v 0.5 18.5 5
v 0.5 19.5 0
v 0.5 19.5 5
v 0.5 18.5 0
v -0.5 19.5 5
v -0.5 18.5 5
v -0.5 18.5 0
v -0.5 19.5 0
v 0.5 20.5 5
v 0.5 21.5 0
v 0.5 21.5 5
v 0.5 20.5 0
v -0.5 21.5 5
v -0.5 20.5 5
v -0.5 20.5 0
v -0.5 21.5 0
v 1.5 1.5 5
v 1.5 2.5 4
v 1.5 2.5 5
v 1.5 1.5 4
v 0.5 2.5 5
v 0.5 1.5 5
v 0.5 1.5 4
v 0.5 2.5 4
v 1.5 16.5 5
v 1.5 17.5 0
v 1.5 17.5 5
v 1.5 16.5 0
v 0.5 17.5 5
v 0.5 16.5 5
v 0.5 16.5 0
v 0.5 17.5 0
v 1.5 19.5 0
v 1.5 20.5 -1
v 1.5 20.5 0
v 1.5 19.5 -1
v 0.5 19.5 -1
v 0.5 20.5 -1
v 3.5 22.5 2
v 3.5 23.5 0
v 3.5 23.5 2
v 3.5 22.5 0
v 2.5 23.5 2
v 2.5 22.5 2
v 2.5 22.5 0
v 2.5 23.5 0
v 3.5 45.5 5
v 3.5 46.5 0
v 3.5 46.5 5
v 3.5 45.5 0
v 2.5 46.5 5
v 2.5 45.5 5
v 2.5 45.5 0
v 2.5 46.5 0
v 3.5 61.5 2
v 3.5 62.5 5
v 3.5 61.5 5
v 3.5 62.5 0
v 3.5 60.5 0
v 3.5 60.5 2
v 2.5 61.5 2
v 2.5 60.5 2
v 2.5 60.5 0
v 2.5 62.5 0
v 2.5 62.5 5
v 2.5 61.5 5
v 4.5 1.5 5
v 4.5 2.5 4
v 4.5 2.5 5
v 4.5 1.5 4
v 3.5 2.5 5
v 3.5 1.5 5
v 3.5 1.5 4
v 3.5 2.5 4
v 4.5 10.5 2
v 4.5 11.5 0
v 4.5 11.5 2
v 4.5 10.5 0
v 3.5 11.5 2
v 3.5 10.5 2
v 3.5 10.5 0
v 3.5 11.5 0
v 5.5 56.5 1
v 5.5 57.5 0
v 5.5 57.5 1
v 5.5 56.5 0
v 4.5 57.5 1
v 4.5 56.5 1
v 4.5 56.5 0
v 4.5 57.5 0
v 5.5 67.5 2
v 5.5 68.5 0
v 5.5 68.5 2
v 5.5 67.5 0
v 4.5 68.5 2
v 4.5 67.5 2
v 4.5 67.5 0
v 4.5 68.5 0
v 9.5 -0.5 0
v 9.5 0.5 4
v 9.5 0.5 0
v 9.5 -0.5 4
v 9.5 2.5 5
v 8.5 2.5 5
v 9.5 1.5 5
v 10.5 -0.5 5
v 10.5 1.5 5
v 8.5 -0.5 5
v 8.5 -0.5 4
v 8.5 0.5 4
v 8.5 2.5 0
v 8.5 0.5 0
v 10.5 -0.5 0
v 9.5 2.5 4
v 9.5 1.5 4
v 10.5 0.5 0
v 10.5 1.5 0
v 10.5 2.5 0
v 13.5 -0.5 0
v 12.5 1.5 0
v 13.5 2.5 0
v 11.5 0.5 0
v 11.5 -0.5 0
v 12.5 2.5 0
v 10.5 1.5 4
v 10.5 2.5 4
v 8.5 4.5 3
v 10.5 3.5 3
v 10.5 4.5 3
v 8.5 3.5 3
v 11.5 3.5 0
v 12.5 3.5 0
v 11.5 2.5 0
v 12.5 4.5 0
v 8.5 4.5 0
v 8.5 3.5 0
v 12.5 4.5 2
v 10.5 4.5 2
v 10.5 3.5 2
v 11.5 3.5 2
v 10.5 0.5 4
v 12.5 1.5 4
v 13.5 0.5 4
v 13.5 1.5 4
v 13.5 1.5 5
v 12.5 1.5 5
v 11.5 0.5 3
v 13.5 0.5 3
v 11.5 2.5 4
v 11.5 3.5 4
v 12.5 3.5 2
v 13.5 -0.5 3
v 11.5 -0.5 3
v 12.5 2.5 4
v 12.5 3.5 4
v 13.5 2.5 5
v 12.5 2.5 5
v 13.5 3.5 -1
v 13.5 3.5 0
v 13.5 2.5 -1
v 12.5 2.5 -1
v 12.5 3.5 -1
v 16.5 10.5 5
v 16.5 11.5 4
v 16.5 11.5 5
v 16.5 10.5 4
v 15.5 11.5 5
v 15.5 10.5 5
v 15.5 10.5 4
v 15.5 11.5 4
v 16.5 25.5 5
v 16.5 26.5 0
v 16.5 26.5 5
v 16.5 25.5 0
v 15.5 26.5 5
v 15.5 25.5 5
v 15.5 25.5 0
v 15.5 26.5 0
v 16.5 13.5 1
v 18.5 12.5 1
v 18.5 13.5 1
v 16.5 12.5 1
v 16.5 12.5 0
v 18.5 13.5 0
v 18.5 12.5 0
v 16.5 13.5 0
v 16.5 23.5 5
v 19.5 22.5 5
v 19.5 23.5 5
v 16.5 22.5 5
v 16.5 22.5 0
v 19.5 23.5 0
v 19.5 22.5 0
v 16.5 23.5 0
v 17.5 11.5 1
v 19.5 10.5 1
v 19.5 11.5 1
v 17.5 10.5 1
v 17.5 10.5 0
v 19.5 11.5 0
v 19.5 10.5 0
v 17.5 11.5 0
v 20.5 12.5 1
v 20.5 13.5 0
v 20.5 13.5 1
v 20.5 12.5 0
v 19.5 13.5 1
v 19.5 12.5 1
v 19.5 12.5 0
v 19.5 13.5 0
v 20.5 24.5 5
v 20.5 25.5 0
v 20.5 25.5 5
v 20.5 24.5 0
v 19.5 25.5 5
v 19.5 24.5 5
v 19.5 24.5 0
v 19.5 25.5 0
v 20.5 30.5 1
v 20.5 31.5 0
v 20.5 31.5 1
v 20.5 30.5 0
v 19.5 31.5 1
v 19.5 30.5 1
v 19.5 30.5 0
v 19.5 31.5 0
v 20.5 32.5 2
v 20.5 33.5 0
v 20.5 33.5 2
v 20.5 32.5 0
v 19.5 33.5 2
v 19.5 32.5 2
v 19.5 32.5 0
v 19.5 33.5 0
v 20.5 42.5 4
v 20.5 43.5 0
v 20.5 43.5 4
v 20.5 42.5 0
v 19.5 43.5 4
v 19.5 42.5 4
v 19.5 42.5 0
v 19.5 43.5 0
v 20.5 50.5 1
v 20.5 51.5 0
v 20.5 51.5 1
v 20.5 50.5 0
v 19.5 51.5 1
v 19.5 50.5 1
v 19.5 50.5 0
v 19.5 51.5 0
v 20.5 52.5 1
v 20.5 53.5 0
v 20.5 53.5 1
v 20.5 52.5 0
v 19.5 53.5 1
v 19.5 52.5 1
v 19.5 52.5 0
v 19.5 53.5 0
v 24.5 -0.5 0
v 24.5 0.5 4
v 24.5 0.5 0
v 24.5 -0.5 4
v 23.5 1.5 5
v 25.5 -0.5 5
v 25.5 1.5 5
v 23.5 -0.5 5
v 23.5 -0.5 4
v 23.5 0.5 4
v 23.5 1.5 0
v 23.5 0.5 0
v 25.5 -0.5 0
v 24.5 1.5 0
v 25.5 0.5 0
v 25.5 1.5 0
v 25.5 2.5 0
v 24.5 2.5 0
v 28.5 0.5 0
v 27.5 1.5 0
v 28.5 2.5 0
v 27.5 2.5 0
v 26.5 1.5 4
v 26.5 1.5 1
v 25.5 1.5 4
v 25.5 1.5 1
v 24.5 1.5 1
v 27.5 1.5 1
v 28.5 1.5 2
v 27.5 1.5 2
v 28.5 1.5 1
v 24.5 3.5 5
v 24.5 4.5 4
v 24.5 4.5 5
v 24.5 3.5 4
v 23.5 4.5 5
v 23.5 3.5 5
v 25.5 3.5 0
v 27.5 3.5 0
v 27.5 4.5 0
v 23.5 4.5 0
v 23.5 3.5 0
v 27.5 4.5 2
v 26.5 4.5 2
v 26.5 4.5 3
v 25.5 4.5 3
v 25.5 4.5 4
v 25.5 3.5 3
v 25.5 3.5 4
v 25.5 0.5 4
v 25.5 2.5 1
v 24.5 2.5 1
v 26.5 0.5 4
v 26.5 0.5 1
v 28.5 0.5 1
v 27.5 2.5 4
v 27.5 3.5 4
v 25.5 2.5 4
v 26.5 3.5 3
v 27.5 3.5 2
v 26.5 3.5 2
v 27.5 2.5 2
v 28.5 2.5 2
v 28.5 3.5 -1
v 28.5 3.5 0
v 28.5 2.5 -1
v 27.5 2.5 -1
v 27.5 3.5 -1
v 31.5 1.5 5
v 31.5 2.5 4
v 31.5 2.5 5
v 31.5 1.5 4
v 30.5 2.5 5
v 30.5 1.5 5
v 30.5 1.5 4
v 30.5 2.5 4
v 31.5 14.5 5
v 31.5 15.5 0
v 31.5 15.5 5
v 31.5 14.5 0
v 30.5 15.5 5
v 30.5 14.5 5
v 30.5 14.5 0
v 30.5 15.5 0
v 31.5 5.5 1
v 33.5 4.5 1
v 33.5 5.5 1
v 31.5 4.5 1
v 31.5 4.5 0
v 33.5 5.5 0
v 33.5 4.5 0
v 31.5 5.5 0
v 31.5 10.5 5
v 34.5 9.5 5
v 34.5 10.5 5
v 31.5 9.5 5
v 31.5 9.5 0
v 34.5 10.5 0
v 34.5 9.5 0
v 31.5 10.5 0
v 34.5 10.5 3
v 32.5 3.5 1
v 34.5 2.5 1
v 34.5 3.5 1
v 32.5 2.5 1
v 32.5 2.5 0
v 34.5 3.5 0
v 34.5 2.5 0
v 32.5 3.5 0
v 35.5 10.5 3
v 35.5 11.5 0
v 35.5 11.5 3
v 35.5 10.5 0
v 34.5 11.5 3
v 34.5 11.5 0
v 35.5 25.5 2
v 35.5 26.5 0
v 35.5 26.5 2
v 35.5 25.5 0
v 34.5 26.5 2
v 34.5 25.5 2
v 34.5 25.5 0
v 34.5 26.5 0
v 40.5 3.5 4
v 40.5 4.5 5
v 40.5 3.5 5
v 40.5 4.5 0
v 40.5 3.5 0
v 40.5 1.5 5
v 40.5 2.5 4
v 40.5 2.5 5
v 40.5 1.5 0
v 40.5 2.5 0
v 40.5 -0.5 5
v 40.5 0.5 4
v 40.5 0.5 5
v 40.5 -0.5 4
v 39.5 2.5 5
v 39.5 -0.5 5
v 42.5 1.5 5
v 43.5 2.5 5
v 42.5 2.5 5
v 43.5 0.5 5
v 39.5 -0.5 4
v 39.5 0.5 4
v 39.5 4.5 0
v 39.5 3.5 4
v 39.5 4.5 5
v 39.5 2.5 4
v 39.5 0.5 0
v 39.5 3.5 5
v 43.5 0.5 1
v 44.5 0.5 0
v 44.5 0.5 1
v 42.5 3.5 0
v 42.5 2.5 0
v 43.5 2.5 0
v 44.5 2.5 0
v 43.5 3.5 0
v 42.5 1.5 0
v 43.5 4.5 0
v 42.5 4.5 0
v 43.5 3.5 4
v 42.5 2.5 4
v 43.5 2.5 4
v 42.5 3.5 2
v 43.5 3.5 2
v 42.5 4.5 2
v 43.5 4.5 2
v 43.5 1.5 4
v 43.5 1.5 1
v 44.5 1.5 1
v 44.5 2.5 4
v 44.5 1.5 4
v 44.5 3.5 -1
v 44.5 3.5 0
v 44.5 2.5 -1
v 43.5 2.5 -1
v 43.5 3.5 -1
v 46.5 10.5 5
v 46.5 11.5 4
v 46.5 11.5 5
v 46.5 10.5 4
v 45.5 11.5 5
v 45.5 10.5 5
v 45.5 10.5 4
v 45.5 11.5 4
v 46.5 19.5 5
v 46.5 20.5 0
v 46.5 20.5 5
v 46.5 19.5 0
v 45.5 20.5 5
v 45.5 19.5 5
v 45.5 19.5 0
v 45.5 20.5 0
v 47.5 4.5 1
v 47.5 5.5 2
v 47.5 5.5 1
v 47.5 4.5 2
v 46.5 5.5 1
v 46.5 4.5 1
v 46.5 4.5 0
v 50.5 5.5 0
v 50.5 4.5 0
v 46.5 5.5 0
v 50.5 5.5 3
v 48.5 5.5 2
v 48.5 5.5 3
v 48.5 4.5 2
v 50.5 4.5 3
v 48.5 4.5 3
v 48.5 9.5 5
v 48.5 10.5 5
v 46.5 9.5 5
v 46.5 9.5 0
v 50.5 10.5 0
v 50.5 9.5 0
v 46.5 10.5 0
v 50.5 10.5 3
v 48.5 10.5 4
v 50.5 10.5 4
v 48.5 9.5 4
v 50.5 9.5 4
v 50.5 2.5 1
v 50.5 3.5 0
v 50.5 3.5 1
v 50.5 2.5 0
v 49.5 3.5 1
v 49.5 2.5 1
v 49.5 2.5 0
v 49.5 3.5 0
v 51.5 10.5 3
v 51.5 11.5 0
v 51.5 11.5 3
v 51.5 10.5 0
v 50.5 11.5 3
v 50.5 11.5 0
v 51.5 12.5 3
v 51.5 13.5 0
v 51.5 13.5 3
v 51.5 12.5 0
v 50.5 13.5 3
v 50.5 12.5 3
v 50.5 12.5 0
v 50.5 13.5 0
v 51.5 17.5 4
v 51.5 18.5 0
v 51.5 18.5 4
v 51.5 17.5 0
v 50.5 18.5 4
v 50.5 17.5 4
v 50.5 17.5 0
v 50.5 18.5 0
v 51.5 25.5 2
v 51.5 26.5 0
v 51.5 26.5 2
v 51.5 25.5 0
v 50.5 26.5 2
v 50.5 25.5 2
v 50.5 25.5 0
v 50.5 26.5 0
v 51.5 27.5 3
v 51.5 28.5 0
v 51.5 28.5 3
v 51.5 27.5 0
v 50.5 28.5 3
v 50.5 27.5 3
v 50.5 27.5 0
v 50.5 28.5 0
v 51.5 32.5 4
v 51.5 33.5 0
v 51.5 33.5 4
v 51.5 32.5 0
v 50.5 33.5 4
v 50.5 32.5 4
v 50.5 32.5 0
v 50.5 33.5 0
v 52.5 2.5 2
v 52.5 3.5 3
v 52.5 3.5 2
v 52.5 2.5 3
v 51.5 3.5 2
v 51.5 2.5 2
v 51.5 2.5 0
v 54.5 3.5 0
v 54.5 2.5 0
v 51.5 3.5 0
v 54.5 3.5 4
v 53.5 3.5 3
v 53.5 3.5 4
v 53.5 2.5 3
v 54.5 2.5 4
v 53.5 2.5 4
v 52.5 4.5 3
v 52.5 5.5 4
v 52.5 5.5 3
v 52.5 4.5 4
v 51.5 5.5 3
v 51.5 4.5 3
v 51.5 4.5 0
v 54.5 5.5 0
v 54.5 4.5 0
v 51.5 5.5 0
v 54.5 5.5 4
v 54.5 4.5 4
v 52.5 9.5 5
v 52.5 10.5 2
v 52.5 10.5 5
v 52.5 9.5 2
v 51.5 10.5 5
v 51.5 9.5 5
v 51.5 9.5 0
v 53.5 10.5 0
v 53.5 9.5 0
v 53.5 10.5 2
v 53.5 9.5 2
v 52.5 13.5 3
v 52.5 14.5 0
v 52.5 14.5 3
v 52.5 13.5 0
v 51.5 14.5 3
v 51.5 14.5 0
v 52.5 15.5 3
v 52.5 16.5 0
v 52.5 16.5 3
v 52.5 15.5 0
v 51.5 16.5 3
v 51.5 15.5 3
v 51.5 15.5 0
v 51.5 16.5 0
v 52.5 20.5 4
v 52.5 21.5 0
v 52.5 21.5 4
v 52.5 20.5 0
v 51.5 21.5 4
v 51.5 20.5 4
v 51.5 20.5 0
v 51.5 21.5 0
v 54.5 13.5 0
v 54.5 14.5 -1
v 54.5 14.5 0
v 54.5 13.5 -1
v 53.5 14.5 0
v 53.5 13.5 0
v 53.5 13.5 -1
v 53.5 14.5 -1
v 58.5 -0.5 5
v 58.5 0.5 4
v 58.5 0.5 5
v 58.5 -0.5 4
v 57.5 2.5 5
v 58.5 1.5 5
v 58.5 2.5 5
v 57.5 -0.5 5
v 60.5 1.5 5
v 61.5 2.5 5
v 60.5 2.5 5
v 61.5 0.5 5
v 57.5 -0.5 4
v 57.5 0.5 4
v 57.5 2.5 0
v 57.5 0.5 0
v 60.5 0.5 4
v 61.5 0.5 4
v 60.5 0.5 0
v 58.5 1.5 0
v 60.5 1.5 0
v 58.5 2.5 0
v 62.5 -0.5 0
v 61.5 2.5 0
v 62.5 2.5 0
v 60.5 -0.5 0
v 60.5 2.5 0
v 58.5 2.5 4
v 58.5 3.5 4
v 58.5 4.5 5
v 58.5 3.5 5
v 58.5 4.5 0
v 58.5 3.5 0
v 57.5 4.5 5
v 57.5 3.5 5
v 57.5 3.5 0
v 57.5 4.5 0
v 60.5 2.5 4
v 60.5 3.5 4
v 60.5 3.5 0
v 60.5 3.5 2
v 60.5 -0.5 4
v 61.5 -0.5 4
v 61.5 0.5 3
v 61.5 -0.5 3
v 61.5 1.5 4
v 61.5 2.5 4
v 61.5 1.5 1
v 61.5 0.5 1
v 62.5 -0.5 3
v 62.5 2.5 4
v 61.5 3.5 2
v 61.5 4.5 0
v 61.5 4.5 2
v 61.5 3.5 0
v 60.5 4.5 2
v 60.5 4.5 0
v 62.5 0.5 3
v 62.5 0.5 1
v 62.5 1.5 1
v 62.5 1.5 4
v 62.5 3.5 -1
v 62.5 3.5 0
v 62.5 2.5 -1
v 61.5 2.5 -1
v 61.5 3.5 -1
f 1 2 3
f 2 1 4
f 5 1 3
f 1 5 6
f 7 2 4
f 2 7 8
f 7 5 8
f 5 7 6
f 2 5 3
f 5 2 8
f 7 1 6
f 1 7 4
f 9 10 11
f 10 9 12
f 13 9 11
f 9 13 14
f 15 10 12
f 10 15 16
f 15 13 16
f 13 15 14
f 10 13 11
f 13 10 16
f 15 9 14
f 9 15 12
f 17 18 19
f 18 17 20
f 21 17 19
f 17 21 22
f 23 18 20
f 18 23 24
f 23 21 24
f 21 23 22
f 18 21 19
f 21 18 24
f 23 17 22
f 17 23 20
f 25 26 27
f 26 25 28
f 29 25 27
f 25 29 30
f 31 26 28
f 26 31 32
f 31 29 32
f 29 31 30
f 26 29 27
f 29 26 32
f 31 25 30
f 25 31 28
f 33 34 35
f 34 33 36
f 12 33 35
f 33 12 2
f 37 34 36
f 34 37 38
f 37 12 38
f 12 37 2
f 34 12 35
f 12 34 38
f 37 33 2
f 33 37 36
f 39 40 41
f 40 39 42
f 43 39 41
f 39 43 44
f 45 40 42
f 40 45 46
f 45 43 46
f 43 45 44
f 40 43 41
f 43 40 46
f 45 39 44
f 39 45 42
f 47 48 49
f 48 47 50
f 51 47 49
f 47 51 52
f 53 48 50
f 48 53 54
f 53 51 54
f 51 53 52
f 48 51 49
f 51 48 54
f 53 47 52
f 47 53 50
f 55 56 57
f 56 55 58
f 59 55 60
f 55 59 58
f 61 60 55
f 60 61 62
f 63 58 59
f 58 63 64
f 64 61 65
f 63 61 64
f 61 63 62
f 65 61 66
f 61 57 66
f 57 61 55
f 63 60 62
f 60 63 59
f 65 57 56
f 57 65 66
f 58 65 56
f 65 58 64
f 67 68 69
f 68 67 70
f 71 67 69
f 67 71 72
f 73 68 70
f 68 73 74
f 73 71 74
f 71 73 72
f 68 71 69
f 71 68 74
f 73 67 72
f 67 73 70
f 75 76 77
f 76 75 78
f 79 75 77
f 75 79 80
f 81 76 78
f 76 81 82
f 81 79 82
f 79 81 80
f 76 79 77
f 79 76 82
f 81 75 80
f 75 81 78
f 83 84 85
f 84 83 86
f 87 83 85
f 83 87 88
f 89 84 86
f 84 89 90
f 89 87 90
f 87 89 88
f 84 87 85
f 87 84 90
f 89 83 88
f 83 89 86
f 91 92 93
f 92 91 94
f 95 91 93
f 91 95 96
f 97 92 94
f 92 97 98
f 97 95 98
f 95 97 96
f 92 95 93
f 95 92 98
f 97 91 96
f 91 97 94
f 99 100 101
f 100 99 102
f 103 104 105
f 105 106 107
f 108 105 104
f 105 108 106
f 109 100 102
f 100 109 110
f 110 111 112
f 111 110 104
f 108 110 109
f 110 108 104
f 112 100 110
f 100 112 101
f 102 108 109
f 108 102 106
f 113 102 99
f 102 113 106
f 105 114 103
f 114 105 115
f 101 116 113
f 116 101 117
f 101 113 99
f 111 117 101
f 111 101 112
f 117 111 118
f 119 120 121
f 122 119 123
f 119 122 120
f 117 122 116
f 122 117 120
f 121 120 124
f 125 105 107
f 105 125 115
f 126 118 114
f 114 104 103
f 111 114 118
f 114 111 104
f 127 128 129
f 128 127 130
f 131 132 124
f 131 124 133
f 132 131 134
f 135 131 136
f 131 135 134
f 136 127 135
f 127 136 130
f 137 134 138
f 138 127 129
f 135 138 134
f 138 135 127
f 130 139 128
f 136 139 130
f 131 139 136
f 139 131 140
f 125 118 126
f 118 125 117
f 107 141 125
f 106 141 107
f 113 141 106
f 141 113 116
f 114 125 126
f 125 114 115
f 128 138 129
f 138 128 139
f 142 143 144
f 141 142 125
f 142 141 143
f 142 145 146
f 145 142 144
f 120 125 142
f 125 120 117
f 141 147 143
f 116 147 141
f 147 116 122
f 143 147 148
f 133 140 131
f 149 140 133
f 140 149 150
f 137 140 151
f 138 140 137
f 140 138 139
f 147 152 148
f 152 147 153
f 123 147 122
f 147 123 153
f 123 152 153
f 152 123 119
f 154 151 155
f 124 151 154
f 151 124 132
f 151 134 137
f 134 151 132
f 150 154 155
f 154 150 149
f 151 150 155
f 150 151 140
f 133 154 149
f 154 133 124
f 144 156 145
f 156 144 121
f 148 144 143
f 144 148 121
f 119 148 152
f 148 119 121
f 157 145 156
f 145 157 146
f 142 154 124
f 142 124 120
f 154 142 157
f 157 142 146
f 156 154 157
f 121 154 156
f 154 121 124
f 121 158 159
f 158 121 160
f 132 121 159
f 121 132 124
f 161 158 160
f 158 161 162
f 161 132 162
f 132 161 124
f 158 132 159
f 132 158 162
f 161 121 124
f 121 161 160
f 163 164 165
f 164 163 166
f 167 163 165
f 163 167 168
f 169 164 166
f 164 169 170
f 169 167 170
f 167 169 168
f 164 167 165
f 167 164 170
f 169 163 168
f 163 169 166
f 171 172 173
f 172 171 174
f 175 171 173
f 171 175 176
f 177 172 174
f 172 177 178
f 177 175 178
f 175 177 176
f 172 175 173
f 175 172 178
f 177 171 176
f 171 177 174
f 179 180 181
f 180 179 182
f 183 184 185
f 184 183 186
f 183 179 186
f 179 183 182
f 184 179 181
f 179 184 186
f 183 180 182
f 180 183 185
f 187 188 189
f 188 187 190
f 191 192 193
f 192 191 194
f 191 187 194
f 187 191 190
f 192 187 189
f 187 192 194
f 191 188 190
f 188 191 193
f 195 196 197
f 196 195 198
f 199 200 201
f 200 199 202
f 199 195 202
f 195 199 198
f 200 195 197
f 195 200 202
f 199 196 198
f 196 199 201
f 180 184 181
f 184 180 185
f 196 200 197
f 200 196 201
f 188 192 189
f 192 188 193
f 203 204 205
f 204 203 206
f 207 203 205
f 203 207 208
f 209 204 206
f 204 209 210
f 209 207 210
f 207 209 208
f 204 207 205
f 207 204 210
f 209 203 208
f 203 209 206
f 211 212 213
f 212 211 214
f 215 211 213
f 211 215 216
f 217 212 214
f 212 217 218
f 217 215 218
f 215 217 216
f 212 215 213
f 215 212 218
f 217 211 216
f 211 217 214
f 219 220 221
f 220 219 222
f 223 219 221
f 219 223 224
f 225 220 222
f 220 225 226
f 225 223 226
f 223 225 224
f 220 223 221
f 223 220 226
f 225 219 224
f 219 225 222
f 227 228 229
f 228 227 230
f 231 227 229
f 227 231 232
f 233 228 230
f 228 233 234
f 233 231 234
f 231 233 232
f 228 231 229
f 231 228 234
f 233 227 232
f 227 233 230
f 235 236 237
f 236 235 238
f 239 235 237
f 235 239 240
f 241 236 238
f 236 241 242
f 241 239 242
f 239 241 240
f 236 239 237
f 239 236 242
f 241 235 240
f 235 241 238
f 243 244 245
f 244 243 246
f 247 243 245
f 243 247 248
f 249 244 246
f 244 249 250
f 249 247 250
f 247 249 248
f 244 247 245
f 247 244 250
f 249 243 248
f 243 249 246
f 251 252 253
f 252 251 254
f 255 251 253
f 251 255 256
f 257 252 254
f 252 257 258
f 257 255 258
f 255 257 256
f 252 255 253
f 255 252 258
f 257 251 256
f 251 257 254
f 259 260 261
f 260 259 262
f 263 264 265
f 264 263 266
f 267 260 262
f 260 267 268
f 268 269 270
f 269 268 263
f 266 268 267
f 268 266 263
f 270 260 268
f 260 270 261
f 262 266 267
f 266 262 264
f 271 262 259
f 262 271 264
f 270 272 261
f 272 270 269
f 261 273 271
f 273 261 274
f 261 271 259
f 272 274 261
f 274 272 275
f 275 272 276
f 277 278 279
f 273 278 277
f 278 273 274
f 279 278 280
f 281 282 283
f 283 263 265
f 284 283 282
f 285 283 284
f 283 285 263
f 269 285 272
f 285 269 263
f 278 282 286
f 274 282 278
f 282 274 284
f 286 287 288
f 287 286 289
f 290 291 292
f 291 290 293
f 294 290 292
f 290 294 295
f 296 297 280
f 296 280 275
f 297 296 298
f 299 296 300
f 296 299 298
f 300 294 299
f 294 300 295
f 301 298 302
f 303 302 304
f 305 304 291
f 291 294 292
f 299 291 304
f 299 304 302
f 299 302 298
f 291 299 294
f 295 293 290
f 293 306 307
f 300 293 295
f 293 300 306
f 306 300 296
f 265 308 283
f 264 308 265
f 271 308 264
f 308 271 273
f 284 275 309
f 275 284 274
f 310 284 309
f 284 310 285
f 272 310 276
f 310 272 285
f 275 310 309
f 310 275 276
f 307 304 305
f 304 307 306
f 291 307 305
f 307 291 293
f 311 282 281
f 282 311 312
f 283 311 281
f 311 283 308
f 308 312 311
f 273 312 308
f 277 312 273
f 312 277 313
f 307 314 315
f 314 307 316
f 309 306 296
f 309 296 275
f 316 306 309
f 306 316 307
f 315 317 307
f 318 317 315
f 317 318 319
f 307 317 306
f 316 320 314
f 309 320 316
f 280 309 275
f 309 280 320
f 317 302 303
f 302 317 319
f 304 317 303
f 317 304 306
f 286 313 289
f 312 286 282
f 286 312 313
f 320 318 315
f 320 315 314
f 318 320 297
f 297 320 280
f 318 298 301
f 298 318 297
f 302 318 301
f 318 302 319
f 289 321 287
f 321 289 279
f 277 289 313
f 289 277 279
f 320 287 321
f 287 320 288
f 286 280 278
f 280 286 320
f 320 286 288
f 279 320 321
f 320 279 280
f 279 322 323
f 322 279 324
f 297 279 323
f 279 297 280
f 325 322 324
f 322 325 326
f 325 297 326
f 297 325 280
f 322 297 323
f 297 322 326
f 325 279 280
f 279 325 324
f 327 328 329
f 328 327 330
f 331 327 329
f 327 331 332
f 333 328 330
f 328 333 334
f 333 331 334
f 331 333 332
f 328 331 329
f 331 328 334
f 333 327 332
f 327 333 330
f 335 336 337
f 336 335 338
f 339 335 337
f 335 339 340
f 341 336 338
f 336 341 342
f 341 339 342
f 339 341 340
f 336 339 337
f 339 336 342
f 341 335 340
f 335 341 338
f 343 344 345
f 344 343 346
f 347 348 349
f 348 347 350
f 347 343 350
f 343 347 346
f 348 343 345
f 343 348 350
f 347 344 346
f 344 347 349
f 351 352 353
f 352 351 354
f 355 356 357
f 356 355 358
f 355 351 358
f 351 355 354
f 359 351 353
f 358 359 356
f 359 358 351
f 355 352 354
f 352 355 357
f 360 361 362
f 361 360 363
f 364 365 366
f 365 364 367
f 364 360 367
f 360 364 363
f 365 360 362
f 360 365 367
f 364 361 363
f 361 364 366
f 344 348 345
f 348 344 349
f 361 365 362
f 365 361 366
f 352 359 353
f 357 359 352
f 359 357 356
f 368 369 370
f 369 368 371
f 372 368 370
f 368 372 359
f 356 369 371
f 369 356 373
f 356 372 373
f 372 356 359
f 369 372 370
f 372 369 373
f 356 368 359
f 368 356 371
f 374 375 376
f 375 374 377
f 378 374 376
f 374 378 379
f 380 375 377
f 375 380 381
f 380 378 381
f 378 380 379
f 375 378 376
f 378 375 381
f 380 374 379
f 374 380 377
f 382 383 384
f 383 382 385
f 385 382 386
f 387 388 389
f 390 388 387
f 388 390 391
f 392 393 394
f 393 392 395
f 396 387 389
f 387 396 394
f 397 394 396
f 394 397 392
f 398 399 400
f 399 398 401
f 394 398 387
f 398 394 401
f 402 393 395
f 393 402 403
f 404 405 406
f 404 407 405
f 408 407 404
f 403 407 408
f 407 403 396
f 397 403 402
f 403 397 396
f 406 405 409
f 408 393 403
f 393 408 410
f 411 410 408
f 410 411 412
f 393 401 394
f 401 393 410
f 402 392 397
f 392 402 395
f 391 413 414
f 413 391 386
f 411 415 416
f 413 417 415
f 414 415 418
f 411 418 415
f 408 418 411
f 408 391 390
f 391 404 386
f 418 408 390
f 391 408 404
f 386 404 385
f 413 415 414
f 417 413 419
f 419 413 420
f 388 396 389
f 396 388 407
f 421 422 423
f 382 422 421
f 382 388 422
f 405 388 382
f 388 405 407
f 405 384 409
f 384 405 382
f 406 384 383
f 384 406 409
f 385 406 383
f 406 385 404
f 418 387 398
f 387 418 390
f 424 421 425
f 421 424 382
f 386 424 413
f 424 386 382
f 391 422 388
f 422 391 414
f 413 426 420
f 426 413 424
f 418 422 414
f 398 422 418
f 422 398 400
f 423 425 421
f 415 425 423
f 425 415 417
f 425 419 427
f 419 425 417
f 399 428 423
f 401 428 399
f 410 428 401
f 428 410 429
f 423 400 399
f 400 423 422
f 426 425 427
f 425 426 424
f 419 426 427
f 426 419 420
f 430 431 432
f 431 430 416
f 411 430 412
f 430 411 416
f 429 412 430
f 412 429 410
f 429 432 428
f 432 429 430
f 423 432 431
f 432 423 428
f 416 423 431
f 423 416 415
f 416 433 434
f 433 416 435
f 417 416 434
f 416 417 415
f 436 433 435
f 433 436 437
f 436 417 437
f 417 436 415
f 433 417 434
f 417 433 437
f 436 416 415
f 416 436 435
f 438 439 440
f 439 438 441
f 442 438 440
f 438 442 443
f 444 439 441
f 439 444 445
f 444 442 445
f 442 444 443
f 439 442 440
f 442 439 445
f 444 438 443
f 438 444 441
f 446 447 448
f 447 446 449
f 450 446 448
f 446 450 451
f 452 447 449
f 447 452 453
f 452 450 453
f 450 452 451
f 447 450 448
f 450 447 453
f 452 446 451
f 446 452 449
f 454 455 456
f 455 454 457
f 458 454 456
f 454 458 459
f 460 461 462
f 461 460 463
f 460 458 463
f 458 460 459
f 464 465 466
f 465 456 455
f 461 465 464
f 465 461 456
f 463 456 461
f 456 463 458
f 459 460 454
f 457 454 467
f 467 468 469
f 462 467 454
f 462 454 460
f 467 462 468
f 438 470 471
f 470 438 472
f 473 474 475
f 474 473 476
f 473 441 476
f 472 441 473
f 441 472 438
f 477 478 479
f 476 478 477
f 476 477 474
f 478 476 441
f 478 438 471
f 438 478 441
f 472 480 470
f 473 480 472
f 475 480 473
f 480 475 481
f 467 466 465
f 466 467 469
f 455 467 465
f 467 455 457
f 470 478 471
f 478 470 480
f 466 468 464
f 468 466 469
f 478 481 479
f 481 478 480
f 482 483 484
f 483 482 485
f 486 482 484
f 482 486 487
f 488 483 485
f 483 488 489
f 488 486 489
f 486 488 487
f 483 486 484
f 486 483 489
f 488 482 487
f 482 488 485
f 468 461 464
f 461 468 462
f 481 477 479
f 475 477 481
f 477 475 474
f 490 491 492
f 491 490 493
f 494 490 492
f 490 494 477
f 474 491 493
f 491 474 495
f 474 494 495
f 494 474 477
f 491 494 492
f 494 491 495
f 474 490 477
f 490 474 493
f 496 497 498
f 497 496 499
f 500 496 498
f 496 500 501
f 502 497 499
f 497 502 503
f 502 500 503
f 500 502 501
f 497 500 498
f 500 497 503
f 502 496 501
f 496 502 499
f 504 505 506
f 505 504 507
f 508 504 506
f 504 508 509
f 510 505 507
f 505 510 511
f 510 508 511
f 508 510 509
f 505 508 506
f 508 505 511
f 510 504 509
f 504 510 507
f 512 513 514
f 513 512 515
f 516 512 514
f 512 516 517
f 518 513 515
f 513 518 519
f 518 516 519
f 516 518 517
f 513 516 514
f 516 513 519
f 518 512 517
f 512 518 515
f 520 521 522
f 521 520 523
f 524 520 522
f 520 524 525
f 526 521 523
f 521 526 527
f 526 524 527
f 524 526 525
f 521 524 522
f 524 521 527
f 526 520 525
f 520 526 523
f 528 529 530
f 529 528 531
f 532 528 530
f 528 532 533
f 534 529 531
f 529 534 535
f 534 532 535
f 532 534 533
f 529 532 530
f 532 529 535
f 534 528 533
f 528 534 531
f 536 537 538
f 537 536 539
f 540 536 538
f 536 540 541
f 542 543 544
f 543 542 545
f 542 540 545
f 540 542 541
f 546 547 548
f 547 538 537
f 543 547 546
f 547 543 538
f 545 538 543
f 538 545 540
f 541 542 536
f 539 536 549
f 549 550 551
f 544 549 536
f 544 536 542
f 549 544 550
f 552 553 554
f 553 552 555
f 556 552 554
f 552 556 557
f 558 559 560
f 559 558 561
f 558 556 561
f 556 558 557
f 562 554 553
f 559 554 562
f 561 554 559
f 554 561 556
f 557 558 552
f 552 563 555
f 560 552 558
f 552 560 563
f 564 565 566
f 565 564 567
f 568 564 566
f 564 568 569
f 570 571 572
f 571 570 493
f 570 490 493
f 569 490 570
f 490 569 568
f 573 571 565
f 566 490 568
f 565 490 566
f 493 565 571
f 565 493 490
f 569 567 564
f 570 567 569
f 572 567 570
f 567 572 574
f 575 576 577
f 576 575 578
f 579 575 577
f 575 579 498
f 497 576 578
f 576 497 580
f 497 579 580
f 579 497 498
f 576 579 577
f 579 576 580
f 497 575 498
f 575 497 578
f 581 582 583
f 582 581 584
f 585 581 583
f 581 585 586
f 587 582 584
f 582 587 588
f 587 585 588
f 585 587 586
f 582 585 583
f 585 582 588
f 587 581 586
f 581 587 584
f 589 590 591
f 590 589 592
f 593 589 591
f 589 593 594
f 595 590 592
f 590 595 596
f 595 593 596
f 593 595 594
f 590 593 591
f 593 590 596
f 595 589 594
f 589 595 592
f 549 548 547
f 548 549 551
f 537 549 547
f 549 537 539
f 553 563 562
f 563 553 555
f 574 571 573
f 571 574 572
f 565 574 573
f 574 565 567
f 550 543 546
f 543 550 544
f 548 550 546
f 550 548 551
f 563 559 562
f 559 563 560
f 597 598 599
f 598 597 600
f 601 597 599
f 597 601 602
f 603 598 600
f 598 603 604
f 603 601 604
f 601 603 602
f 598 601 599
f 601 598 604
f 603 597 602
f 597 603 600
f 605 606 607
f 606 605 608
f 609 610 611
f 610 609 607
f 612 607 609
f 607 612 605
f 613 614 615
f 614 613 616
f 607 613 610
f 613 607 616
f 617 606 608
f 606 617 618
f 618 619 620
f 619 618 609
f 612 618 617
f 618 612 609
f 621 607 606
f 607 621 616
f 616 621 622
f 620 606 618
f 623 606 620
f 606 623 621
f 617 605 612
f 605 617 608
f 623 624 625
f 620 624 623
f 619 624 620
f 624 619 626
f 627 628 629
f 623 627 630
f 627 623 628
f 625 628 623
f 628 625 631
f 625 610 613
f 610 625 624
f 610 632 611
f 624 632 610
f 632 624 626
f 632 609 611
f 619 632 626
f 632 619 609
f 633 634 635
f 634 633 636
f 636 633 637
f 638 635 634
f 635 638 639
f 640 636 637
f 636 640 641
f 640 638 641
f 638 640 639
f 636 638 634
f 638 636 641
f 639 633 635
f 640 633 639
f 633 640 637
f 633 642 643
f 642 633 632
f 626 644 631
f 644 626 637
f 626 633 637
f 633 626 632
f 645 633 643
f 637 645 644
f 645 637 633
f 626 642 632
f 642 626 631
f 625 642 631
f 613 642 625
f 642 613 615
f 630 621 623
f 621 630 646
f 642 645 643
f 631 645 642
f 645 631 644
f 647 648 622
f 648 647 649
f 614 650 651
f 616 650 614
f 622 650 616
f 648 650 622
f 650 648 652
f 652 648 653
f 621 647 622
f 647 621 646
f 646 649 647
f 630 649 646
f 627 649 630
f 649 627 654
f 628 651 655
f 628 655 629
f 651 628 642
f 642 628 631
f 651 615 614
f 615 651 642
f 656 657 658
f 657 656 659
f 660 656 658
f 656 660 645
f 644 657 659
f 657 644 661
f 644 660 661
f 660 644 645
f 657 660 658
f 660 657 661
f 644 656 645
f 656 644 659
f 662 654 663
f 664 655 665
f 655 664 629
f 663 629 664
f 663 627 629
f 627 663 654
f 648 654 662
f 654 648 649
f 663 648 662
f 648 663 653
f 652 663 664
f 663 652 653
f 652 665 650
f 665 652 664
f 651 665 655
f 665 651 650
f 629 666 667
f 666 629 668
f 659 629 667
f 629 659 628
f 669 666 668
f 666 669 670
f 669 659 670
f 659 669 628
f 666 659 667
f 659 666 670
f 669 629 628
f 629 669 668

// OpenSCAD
union() {
    translate([0, 19, 2.5]) cube([1, 1, 5], center=true);
    translate([0, 21, 2.5]) cube([1, 1, 5], center=true);
    translate([1, 2, 4.5]) color([1, 0, 0]) cube([1, 1, 1], center=true);
    translate([1, 17, 2.5]) cube([1, 1, 5], center=true);
    translate([1, 20, -0.5]) color([0, 0, 1]) cube([1, 1, 1], center=true);
    translate([3, 23, 1.0]) cube([1, 1, 2], center=true);
    translate([3, 46, 2.5]) cube([1, 1, 5], center=true);
    translate([3, 61, 1.0]) cube([1, 1, 2], center=true);
    translate([3, 62, 2.5]) cube([1, 1, 5], center=true);
    translate([4, 2, 4.5]) color([1, 0, 0]) cube([1, 1, 1], center=true);
    translate([4, 11, 1.0]) cube([1, 1, 2], center=true);
    translate([5, 57, 0.5]) cube([1, 1, 1], center=true);
    translate([5, 68, 1.0]) cube([1, 1, 2], center=true);
    translate([9, 0, 4.5]) color([1, 0, 0]) cube([1, 1, 1], center=true);
    translate([9, 1, 2.5]) cube([1, 1, 5], center=true);
    translate([9, 2, 2.5]) cube([1, 1, 5], center=true);
    translate([9, 4, 1.5]) cube([1, 1, 3], center=true);
    translate([10, 0, 2.5]) cube([1, 1, 5], center=true);
    translate([10, 1, 2.5]) cube([1, 1, 5], center=true);
    translate([10, 2, 2.0]) cube([1, 1, 4], center=true);
    translate([10, 4, 1.5]) cube([1, 1, 3], center=true);
    translate([11, 1, 2.0]) cube([1, 1, 4], center=true);
    translate([11, 4, 1.0]) cube([1, 1, 2], center=true);
    translate([12, 0, 1.5]) cube([1, 1, 3], center=true);
    translate([12, 1, 2.0]) cube([1, 1, 4], center=true);
    translate([12, 3, 2.0]) cube([1, 1, 4], center=true);
    translate([12, 4, 1.0]) cube([1, 1, 2], center=true);
    translate([13, 0, 1.5]) cube([1, 1, 3], center=true);
    translate([13, 1, 2.0]) cube([1, 1, 4], center=true);
    translate([13, 2, 2.5]) cube([1, 1, 5], center=true);
    translate([13, 3, -0.5]) color([0, 0, 1]) cube([1, 1, 1], center=true);
    translate([16, 11, 4.5]) color([1, 0, 0]) cube([1, 1, 1], center=true);
    translate([16, 26, 2.5]) cube([1, 1, 5], center=true);
    translate([17, 13, 0.5]) cube([1, 1, 1], center=true);
    translate([17, 23, 2.5]) cube([1, 1, 5], center=true);
    translate([18, 11, 0.5]) cube([1, 1, 1], center=true);
    translate([18, 13, 0.5]) cube([1, 1, 1], center=true);
    translate([18, 23, 2.5]) cube([1, 1, 5], center=true);
    translate([19, 11, 0.5]) cube([1, 1, 1], center=true);
    translate([19, 23, 2.5]) cube([1, 1, 5], center=true);
    translate([20, 13, 0.5]) cube([1, 1, 1], center=true);
    translate([20, 25, 2.5]) cube([1, 1, 5], center=true);
    translate([20, 31, 0.5]) cube([1, 1, 1], center=true);
    translate([20, 33, 1.0]) cube([1, 1, 2], center=true);
    translate([20, 43, 2.0]) cube([1, 1, 4], center=true);
    translate([20, 51, 0.5]) cube([1, 1, 1], center=true);
    translate([20, 53, 0.5]) cube([1, 1, 1], center=true);
    translate([24, 0, 4.5]) color([1, 0, 0]) cube([1, 1, 1], center=true);
    translate([24, 1, 2.5]) cube([1, 1, 5], center=true);
    translate([24, 4, 2.5]) cube([1, 1, 5], center=true);
    translate([25, 0, 2.5]) cube([1, 1, 5], center=true);
    translate([25, 1, 2.5]) cube([1, 1, 5], center=true);
    translate([25, 2, 0.5]) cube([1, 1, 1], center=true);
    translate([25, 4, 2.0]) cube([1, 1, 4], center=true);
    translate([26, 1, 2.0]) cube([1, 1, 4], center=true);
    translate([26, 3, 2.0]) cube([1, 1, 4], center=true);
    translate([26, 4, 1.5]) cube([1, 1, 3], center=true);
    translate([27, 1, 0.5]) cube([1, 1, 1], center=true);
    translate([27, 3, 2.0]) cube([1, 1, 4], center=true);
    translate([27, 4, 1.0]) cube([1, 1, 2], center=true);
    translate([28, 1, 0.5]) cube([1, 1, 1], center=true);
    translate([28, 2, 1.0]) cube([1, 1, 2], center=true);
    translate([28, 3, -0.5]) color([0, 0, 1]) cube([1, 1, 1], center=true);
    translate([31, 2, 4.5]) color([1, 0, 0]) cube([1, 1, 1], center=true);
    translate([31, 15, 2.5]) cube([1, 1, 5], center=true);
    translate([32, 5, 0.5]) cube([1, 1, 1], center=true);
    translate([32, 10, 2.5]) cube([1, 1, 5], center=true);
    translate([33, 3, 0.5]) cube([1, 1, 1], center=true);
    translate([33, 5, 0.5]) cube([1, 1, 1], center=true);
    translate([33, 10, 2.5]) cube([1, 1, 5], center=true);
    translate([34, 3, 0.5]) cube([1, 1, 1], center=true);
    translate([34, 10, 2.5]) cube([1, 1, 5], center=true);
    translate([35, 11, 1.5]) cube([1, 1, 3], center=true);
    translate([35, 26, 1.0]) cube([1, 1, 2], center=true);
    translate([40, 0, 4.5]) color([1, 0, 0]) cube([1, 1, 1], center=true);
    translate([40, 1, 2.5]) cube([1, 1, 5], center=true);
    translate([40, 2, 2.5]) cube([1, 1, 5], center=true);
    translate([40, 3, 2.0]) cube([1, 1, 4], center=true);
    translate([40, 4, 2.5]) cube([1, 1, 5], center=true);
    translate([41, 1, 2.5]) cube([1, 1, 5], center=true);
    translate([41, 3, 2.0]) cube([1, 1, 4], center=true);
    translate([42, 1, 2.5]) cube([1, 1, 5], center=true);
    translate([42, 3, 2.0]) cube([1, 1, 4], center=true);
    translate([43, 1, 2.5]) cube([1, 1, 5], center=true);
    translate([43, 2, 2.5]) cube([1, 1, 5], center=true);
    translate([43, 3, 2.0]) cube([1, 1, 4], center=true);
    translate([43, 4, 1.0]) cube([1, 1, 2], center=true);
    translate([44, 1, 0.5]) cube([1, 1, 1], center=true);
    translate([44, 2, 2.0]) cube([1, 1, 4], center=true);
    translate([44, 3, -0.5]) color([0, 0, 1]) cube([1, 1, 1], center=true);
    translate([46, 11, 4.5]) color([1, 0, 0]) cube([1, 1, 1], center=true);
    translate([46, 20, 2.5]) cube([1, 1, 5], center=true);
    translate([47, 5, 0.5]) cube([1, 1, 1], center=true);
    translate([47, 10, 2.5]) cube([1, 1, 5], center=true);
    translate([48, 5, 1.0]) cube([1, 1, 2], center=true);
    translate([48, 10, 2.5]) cube([1, 1, 5], center=true);
    translate([49, 5, 1.5]) cube([1, 1, 3], center=true);
    translate([49, 10, 2.0]) cube([1, 1, 4], center=true);
    translate([50, 3, 0.5]) cube([1, 1, 1], center=true);
    translate([50, 5, 1.5]) cube([1, 1, 3], center=true);
    translate([50, 10, 2.0]) cube([1, 1, 4], center=true);
    translate([51, 11, 1.5]) cube([1, 1, 3], center=true);
    translate([51, 13, 1.5]) cube([1, 1, 3], center=true);
    translate([51, 18, 2.0]) cube([1, 1, 4], center=true);
    translate([51, 26, 1.0]) cube([1, 1, 2], center=true);
    translate([51, 28, 1.5]) cube([1, 1, 3], center=true);
    translate([51, 33, 2.0]) cube([1, 1, 4], center=true);
    translate([52, 3, 1.0]) cube([1, 1, 2], center=true);
    translate([52, 5, 1.5]) cube([1, 1, 3], center=true);
    translate([52, 10, 2.5]) cube([1, 1, 5], center=true);
    translate([52, 14, 1.5]) cube([1, 1, 3], center=true);
    translate([52, 16, 1.5]) cube([1, 1, 3], center=true);
    translate([52, 21, 2.0]) cube([1, 1, 4], center=true);
    translate([53, 3, 1.5]) cube([1, 1, 3], center=true);
    translate([53, 5, 2.0]) cube([1, 1, 4], center=true);
    translate([53, 10, 1.0]) cube([1, 1, 2], center=true);
    translate([54, 3, 2.0]) cube([1, 1, 4], center=true);
    translate([54, 5, 2.0]) cube([1, 1, 4], center=true);
    translate([54, 14, -0.5]) color([0, 0, 1]) cube([1, 1, 1], center=true);
    translate([58, 0, 4.5]) color([1, 0, 0]) cube([1, 1, 1], center=true);
    translate([58, 1, 2.5]) cube([1, 1, 5], center=true);
    translate([58, 2, 2.5]) cube([1, 1, 5], center=true);
    translate([58, 4, 2.5]) cube([1, 1, 5], center=true);
    translate([59, 1, 2.5]) cube([1, 1, 5], center=true);
    translate([59, 3, 2.0]) cube([1, 1, 4], center=true);
    translate([60, 1, 2.5]) cube([1, 1, 5], center=true);
    translate([60, 3, 2.0]) cube([1, 1, 4], center=true);
    translate([61, 0, 2.0]) cube([1, 1, 4], center=true);
    translate([61, 1, 2.5]) cube([1, 1, 5], center=true);
    translate([61, 2, 2.5]) cube([1, 1, 5], center=true);
    translate([61, 4, 1.0]) cube([1, 1, 2], center=true);
    translate([62, 0, 1.5]) cube([1, 1, 3], center=true);
    translate([62, 1, 0.5]) cube([1, 1, 1], center=true);
    translate([62, 2, 2.0]) cube([1, 1, 4], center=true);
    translate([62, 3, -0.5]) color([0, 0, 1]) cube([1, 1, 1], center=true);
}
